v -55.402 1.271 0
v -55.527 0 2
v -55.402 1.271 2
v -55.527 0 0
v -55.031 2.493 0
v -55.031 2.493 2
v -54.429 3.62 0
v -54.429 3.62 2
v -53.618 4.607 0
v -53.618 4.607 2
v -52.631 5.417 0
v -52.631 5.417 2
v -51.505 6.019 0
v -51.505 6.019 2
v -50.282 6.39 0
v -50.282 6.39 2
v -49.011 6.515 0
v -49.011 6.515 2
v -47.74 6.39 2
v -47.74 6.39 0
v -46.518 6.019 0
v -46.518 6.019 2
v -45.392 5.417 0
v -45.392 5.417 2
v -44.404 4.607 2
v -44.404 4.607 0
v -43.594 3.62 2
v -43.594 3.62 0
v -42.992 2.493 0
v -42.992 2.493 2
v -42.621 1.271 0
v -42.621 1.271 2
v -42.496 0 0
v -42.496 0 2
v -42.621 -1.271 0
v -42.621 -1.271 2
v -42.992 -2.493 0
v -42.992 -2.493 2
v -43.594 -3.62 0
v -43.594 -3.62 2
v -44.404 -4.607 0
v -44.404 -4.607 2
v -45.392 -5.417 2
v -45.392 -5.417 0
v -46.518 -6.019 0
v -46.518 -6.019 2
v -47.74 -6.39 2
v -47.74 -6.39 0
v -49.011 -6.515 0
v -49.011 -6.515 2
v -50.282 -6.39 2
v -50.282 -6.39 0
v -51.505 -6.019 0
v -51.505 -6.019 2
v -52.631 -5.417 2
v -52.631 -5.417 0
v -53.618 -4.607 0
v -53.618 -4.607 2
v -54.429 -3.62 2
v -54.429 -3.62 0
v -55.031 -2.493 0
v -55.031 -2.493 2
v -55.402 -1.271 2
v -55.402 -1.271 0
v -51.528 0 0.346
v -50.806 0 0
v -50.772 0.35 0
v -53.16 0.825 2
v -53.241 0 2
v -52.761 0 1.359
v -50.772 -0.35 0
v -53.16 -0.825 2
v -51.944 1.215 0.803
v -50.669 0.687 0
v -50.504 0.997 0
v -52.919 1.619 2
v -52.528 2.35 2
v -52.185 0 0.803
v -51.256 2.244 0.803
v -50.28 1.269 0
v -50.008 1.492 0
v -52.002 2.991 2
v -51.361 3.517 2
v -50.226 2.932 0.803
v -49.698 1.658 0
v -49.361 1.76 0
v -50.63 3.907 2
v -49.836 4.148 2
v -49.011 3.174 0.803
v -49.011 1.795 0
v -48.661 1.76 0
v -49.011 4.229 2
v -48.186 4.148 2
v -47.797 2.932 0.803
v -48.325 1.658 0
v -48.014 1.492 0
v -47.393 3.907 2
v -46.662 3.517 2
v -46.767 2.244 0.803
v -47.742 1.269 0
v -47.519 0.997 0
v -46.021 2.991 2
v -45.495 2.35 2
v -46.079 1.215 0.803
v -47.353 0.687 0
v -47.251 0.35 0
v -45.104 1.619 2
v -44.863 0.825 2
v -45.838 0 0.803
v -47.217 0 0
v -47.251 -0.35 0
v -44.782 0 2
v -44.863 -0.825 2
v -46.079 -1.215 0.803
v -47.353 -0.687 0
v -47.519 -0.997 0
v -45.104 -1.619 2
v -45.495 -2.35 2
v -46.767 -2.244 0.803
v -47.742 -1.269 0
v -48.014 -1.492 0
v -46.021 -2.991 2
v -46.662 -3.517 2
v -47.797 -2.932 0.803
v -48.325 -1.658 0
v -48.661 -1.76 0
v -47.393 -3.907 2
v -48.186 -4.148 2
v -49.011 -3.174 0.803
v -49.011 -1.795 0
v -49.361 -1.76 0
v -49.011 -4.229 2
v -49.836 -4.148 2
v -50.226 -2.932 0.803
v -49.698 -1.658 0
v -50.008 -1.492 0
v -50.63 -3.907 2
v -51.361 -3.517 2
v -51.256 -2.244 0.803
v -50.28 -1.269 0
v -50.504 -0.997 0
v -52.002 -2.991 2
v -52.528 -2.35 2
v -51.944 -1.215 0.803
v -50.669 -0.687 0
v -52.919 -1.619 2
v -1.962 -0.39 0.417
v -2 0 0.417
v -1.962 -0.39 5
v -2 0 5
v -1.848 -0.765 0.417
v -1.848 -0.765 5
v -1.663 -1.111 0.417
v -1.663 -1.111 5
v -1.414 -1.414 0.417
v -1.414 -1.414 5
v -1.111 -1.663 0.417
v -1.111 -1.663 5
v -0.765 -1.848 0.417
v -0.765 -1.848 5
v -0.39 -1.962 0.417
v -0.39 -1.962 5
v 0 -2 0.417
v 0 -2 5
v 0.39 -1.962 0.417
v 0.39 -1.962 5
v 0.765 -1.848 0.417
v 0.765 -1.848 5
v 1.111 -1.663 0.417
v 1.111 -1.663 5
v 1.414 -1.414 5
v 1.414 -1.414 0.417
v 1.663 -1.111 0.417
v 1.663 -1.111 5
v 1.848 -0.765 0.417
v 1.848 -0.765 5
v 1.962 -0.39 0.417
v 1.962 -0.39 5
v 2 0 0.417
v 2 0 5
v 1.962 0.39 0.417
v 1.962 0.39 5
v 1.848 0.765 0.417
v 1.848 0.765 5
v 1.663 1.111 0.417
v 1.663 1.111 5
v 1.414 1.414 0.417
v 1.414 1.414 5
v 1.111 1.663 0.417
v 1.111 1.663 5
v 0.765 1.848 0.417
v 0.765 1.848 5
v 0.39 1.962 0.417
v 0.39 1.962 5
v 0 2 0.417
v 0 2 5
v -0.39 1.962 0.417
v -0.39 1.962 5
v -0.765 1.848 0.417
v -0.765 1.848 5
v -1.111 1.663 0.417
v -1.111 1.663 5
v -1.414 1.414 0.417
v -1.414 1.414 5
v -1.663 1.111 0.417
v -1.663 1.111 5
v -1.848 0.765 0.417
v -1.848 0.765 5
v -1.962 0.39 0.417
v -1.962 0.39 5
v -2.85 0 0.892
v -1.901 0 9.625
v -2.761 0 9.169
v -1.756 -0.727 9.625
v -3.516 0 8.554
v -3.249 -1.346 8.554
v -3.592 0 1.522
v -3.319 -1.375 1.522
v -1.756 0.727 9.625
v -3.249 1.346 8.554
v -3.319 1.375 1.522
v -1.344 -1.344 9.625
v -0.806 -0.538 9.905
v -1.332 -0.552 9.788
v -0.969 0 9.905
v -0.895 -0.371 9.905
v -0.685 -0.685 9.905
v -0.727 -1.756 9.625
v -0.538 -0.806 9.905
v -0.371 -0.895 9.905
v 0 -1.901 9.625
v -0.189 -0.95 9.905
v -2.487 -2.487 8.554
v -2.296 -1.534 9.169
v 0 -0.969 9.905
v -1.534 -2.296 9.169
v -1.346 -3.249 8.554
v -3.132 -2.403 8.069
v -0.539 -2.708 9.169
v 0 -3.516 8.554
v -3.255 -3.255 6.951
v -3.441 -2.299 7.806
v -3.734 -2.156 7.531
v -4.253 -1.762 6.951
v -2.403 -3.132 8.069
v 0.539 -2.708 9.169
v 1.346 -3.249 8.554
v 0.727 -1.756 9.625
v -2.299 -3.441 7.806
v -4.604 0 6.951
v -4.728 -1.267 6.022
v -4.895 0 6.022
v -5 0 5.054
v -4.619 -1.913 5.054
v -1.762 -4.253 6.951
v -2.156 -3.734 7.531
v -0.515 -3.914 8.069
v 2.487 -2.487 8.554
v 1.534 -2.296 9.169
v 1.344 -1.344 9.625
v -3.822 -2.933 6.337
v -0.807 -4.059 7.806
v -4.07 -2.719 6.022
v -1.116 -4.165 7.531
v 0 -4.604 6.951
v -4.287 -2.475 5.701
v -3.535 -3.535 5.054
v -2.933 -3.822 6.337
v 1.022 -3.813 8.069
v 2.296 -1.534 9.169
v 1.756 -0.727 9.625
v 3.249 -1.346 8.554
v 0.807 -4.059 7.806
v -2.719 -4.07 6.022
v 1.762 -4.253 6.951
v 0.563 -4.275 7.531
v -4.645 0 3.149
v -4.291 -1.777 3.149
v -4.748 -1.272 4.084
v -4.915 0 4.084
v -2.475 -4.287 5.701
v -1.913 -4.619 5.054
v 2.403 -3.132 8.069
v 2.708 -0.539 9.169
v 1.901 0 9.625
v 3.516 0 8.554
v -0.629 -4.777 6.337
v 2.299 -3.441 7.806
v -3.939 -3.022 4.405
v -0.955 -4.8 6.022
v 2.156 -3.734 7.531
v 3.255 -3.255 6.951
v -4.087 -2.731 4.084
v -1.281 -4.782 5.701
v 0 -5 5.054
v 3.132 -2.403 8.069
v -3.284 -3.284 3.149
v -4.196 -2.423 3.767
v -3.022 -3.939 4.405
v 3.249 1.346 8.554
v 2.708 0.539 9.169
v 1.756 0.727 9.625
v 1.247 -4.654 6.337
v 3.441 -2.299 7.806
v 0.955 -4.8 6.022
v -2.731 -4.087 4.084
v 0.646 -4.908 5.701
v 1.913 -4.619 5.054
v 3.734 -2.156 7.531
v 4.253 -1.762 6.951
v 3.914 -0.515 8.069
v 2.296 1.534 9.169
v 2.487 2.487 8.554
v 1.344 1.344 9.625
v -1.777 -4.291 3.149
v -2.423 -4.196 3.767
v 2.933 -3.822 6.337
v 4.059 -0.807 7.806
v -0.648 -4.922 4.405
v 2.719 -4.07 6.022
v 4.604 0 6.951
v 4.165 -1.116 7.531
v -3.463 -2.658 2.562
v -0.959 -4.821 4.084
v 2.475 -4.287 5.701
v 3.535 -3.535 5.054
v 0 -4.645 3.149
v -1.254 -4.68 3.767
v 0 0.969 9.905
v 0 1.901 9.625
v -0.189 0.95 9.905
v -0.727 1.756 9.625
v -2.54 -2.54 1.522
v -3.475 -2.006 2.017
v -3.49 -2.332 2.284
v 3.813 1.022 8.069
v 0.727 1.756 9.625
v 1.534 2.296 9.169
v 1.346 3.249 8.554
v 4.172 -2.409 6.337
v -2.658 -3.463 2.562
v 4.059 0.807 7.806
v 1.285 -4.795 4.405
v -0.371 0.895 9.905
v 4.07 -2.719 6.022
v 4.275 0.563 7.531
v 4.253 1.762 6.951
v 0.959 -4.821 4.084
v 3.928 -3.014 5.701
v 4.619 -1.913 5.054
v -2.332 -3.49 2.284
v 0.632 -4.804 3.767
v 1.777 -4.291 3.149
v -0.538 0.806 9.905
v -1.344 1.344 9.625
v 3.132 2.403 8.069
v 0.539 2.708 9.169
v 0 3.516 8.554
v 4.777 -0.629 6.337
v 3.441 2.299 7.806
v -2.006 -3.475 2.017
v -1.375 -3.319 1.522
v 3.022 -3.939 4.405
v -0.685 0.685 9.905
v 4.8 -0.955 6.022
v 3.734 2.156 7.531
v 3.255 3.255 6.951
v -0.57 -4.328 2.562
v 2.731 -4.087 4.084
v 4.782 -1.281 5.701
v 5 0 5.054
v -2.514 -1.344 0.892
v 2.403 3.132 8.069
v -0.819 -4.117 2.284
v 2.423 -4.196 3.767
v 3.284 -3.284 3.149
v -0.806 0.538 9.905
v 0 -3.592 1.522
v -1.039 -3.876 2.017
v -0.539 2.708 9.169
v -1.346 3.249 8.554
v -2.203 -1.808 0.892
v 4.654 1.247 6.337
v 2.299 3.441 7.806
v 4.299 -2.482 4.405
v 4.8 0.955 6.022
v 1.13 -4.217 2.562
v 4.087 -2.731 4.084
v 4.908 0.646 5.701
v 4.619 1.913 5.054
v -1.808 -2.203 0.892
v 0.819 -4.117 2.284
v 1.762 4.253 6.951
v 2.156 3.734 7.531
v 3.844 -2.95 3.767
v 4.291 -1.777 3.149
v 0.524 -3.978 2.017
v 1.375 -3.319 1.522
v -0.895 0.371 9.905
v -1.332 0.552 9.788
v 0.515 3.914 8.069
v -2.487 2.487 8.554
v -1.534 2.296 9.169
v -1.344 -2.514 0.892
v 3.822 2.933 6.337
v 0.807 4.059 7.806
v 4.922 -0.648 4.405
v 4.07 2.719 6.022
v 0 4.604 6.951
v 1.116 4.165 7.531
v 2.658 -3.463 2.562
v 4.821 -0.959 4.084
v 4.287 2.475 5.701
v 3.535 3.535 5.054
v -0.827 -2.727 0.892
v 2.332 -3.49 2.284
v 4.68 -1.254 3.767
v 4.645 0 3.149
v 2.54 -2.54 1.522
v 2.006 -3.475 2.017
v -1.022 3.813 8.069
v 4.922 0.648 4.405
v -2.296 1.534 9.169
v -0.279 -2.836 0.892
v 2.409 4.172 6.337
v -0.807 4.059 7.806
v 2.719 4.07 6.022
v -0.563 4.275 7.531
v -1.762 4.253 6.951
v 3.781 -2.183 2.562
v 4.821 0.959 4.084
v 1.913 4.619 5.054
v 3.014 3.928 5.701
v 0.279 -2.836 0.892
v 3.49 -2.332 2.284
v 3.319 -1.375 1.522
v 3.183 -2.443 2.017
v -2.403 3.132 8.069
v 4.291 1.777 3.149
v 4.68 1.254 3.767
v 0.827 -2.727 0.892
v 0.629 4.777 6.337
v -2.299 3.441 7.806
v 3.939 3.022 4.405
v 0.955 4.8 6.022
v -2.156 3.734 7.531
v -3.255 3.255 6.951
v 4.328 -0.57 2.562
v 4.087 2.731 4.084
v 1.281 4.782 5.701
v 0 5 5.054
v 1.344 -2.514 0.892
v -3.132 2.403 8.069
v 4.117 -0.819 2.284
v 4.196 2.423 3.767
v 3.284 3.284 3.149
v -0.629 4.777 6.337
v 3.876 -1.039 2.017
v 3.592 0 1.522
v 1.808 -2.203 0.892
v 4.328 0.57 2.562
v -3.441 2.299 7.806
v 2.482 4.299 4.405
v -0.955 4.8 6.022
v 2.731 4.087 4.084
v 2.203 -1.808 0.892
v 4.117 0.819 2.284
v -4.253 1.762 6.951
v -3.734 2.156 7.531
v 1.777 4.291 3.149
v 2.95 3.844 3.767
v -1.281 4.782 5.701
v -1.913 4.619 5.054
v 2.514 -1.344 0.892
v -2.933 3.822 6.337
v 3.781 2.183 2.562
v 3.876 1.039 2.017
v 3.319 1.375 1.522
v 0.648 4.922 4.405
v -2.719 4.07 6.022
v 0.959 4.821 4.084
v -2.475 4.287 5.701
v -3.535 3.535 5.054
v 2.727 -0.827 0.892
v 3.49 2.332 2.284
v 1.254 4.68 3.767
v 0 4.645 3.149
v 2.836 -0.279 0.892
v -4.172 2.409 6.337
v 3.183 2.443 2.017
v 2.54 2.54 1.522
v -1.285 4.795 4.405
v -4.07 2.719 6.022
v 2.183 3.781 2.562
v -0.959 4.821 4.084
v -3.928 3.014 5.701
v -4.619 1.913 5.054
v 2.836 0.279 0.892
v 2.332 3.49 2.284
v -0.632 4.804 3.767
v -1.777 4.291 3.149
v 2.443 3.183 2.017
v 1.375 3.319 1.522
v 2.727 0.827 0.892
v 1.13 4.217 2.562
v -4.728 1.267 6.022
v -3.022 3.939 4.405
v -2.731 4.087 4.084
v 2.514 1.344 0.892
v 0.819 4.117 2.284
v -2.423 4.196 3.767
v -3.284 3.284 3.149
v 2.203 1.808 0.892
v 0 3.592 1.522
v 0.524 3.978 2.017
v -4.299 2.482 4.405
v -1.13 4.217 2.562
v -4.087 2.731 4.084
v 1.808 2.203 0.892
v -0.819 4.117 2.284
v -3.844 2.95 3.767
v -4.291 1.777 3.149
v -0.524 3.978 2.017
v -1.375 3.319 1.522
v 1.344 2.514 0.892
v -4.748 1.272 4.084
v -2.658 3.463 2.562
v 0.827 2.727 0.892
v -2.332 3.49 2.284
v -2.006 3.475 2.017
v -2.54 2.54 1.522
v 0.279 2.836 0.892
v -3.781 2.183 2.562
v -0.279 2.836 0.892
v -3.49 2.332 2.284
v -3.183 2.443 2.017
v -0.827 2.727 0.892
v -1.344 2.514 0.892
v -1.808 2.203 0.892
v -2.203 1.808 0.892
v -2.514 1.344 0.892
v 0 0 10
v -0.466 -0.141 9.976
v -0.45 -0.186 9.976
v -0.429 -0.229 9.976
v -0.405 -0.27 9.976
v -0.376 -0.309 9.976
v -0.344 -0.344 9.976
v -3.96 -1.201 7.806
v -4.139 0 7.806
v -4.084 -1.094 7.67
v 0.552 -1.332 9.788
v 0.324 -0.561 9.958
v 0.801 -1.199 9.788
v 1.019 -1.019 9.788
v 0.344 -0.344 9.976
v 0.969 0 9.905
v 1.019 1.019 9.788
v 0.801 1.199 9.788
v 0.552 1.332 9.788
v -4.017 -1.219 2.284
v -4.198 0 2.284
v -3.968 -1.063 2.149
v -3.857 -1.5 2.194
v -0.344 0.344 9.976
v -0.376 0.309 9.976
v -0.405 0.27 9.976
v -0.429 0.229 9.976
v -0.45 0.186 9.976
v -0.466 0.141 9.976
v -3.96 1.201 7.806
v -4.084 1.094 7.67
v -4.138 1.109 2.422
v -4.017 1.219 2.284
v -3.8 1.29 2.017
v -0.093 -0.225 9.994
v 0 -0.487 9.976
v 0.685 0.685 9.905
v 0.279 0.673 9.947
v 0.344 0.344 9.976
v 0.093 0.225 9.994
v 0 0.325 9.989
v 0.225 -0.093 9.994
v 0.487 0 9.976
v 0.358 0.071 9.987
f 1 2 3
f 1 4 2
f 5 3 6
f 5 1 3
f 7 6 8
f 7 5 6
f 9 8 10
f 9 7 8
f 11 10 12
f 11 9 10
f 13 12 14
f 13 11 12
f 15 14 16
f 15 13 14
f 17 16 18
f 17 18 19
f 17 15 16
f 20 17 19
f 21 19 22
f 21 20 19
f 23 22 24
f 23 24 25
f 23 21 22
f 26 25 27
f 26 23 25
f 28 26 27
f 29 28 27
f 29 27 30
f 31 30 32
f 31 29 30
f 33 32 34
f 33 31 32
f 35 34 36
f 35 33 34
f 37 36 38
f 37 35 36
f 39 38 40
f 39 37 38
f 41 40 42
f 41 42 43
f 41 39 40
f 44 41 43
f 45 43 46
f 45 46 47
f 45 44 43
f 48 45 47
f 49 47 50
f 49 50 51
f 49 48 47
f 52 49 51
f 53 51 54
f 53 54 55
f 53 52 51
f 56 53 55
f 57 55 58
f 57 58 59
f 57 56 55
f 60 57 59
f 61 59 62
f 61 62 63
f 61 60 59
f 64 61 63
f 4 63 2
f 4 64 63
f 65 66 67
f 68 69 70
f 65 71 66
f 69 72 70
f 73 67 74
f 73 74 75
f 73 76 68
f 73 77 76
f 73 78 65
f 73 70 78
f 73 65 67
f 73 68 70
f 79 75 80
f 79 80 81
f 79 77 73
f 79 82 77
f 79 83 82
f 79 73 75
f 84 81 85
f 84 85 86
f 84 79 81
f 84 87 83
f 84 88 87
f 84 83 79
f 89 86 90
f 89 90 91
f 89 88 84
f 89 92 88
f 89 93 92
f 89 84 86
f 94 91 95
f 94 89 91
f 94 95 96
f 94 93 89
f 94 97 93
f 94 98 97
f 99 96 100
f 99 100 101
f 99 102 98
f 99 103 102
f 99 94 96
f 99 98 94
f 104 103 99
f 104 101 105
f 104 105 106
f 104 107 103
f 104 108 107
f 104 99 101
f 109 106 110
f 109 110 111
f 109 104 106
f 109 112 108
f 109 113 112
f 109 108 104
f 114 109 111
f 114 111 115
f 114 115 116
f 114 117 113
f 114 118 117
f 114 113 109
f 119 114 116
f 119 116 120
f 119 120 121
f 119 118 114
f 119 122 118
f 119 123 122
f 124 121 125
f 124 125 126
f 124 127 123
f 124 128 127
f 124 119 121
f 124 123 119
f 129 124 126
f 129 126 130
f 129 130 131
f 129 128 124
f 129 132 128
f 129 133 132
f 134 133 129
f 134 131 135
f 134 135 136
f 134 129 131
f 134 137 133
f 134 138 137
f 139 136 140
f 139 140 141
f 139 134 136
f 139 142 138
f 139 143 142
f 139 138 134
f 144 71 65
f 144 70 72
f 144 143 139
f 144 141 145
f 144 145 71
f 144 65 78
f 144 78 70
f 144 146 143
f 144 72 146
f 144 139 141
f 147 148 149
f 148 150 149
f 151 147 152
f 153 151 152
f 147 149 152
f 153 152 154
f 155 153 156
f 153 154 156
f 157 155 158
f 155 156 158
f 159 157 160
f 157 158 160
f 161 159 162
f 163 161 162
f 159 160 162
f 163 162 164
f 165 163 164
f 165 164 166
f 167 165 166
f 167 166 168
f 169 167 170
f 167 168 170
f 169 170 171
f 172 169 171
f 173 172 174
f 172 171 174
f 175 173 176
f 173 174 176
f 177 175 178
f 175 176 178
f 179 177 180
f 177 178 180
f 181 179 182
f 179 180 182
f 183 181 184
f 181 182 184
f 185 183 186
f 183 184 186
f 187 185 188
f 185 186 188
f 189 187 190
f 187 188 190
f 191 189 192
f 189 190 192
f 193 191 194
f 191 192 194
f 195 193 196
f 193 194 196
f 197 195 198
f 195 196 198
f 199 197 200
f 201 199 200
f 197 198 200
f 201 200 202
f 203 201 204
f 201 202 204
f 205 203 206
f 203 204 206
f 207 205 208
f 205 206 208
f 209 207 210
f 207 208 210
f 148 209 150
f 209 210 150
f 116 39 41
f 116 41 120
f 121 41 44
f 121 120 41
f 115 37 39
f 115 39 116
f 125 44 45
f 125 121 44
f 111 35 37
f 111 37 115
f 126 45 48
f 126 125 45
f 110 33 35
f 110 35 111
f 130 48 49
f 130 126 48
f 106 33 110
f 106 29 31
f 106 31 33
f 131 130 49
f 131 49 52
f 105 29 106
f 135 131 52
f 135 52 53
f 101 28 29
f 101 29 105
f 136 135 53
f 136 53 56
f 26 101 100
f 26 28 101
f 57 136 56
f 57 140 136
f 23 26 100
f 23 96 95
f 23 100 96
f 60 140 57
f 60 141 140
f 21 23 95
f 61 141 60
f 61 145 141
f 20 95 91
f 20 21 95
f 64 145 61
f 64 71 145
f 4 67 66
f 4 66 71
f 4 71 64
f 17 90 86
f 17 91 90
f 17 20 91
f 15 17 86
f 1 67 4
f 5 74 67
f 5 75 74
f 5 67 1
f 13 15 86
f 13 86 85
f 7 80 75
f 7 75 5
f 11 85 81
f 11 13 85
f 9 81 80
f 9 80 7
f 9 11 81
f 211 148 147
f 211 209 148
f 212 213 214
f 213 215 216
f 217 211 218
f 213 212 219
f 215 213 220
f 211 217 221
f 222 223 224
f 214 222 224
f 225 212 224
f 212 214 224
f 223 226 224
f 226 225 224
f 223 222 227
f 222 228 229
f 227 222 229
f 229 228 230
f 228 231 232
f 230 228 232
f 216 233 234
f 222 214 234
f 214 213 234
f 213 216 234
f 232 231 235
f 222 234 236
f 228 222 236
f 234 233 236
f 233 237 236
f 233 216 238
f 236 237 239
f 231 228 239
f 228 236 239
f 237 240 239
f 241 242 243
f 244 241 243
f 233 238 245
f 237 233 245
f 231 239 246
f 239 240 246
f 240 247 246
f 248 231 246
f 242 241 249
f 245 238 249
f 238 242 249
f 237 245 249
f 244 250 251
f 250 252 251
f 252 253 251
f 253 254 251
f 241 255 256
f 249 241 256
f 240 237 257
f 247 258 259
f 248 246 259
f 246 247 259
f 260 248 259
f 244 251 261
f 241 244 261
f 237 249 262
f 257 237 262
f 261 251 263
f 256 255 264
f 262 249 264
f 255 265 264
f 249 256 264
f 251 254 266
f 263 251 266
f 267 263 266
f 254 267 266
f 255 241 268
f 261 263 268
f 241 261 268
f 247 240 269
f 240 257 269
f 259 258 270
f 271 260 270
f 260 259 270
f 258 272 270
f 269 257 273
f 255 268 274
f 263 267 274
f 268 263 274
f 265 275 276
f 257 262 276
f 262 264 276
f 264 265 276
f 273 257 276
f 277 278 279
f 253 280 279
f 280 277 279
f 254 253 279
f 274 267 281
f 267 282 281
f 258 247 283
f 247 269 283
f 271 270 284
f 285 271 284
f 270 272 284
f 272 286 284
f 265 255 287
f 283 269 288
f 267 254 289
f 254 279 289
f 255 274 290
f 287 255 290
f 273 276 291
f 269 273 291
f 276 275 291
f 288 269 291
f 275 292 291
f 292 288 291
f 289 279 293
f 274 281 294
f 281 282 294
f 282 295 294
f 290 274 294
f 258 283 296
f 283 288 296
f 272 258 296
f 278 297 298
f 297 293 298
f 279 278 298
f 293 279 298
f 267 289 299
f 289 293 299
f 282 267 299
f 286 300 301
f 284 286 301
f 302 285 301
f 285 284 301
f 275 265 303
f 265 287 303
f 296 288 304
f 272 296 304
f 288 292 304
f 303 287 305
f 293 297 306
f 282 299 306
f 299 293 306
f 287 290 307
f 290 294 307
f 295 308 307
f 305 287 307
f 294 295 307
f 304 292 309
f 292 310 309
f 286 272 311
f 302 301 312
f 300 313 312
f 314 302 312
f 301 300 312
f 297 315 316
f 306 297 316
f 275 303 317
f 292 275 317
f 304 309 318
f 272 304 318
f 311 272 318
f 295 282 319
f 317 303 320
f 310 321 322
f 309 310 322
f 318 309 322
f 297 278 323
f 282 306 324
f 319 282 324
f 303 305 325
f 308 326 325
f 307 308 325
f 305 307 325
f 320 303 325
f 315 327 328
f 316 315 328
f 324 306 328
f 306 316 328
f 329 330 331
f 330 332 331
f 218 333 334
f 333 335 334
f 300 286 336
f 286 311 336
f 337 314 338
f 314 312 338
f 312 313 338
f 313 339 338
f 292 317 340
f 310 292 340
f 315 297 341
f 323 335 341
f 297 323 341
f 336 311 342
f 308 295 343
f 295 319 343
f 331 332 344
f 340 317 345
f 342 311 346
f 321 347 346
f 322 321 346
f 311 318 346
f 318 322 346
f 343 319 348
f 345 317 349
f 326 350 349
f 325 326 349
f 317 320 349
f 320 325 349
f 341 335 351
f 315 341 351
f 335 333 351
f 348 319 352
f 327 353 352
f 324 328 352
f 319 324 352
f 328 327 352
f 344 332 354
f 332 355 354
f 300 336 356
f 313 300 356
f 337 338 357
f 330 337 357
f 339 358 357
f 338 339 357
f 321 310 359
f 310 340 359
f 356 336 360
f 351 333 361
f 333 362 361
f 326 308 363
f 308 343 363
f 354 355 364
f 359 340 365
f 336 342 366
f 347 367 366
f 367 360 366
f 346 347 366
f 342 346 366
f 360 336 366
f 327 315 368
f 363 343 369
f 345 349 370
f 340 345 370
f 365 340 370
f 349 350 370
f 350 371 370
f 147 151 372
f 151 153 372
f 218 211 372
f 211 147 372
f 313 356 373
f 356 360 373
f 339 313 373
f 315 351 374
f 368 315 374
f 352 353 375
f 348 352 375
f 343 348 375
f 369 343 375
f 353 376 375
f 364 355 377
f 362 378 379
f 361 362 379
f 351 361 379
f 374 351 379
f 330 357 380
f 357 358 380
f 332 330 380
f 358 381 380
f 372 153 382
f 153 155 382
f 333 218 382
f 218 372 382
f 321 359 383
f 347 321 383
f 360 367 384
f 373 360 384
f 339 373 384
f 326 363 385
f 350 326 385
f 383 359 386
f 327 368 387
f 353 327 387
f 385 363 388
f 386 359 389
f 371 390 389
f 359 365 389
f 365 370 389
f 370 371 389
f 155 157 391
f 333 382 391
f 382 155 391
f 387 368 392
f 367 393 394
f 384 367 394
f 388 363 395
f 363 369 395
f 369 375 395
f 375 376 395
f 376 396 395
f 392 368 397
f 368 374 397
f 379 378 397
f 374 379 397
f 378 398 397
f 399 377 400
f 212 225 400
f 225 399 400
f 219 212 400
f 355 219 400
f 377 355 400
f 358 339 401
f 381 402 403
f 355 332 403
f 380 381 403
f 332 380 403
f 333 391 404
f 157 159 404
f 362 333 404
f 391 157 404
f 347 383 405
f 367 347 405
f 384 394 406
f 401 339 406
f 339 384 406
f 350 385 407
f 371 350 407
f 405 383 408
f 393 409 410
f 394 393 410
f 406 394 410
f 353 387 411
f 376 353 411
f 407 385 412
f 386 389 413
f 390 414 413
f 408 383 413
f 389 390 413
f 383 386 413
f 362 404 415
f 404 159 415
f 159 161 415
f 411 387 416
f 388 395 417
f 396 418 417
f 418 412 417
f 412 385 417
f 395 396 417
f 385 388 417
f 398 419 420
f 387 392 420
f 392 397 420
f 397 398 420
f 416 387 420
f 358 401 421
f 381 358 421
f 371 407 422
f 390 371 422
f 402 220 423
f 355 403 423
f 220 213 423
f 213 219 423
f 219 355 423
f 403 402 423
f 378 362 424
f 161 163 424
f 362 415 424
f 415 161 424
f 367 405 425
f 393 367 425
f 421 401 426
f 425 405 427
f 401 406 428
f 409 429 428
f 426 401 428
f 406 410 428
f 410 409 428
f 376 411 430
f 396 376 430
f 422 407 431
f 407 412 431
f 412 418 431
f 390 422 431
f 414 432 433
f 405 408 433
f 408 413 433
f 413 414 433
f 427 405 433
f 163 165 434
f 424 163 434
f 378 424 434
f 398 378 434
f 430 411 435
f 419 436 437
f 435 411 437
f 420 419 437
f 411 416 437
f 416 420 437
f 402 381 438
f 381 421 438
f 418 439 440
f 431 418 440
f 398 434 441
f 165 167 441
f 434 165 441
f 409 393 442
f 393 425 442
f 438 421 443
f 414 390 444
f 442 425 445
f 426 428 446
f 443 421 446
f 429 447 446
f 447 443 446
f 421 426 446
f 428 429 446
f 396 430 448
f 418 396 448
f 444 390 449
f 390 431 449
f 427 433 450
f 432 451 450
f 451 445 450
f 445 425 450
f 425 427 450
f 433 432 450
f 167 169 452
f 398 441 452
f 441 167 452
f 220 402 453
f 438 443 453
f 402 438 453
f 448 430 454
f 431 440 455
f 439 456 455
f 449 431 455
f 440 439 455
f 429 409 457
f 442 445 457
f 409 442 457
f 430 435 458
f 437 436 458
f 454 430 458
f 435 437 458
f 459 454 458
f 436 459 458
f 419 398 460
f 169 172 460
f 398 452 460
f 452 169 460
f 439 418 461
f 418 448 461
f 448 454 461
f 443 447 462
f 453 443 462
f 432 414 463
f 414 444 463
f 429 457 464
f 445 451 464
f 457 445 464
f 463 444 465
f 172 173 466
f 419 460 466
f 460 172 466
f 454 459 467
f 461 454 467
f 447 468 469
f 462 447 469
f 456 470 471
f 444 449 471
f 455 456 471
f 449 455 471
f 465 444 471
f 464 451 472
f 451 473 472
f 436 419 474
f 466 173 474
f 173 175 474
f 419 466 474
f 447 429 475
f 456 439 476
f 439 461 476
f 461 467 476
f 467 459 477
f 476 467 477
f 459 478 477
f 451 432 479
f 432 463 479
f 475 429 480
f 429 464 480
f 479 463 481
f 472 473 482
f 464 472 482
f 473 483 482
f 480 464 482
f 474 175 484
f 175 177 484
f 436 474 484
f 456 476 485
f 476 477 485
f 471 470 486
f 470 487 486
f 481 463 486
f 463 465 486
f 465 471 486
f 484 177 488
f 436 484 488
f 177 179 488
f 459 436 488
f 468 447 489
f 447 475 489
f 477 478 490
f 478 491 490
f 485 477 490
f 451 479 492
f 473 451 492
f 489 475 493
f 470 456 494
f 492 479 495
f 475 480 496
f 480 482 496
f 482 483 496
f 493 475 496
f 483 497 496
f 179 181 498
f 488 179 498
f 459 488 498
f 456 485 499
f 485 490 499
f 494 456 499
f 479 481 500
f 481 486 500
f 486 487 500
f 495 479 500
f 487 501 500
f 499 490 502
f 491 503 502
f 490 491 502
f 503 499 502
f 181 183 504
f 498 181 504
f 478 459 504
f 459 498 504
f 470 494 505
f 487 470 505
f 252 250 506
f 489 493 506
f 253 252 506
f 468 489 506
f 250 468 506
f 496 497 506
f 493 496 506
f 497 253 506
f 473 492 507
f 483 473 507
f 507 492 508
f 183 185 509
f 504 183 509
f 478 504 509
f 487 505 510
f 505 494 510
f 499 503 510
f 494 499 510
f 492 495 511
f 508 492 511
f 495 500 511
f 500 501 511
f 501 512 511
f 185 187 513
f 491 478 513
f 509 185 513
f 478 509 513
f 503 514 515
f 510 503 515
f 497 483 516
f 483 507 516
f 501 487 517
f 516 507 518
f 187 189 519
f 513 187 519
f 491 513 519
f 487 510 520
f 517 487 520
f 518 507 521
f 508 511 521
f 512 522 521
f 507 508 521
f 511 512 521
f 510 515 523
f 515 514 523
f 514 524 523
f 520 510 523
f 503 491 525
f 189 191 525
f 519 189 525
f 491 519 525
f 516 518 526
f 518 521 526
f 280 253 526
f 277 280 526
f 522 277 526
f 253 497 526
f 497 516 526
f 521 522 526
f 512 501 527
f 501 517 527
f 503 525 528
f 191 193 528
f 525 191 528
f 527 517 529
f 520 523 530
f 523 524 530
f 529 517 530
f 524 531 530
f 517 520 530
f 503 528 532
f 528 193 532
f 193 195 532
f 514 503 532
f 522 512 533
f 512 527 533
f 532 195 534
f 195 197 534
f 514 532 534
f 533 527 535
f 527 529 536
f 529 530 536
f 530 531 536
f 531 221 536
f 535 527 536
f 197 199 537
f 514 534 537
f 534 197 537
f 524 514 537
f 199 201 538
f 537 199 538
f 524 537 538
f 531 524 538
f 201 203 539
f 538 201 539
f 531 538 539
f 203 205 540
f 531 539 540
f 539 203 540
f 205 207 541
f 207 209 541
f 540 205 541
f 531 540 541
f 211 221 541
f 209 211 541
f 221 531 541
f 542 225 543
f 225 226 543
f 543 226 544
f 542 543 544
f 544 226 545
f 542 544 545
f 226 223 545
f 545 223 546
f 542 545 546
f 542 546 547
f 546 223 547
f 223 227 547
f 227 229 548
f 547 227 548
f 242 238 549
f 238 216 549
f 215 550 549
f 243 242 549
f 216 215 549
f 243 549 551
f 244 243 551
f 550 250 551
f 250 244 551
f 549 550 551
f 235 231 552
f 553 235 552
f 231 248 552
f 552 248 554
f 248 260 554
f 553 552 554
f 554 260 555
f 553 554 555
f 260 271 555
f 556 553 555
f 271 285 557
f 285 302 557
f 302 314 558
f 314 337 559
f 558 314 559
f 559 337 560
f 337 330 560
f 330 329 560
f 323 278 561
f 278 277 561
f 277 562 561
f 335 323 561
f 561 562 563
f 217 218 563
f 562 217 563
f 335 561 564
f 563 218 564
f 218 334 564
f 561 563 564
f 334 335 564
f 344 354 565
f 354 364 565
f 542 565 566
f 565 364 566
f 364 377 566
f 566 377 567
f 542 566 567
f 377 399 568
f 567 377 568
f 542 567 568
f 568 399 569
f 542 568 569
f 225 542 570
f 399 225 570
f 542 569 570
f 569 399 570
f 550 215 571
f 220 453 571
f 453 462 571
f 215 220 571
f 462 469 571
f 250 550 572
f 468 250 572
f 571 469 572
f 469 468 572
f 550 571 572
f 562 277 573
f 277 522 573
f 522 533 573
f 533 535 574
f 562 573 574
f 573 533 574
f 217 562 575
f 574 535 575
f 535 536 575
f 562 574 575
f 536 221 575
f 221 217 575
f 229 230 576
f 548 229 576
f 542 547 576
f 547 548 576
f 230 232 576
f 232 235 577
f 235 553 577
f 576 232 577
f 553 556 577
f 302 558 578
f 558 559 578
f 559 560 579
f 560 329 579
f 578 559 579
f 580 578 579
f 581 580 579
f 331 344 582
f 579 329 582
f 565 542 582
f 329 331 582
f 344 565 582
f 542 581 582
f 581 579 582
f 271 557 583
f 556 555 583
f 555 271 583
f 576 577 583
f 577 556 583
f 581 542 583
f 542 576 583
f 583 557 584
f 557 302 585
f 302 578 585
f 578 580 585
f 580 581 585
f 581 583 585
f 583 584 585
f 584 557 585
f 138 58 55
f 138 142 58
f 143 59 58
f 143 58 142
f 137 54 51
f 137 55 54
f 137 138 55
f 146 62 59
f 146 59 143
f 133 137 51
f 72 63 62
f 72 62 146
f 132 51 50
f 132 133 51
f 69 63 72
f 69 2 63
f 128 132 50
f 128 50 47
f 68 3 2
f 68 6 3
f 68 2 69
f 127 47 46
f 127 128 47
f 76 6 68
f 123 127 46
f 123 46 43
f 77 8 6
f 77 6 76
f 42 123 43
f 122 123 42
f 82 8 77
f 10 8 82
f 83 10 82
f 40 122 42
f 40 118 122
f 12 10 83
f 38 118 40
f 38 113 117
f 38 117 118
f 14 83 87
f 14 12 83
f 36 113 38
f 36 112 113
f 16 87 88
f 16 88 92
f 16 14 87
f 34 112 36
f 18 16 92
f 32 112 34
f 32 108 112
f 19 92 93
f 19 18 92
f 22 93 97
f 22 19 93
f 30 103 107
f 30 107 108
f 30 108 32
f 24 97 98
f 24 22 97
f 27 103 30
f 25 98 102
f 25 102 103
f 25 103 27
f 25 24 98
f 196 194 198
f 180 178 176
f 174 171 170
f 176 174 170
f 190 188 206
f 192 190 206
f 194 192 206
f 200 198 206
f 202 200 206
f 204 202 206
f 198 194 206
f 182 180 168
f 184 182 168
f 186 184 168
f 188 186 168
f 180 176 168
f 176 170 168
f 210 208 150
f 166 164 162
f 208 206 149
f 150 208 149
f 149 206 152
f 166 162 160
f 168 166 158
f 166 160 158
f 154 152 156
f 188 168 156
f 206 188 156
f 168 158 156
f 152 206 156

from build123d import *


with BuildPart() as f1:
    # F0 (on Front) → F1 (revolve)
    with BuildSketch(Plane.XZ):
        with BuildLine():
            ThreePointArc((0, 10), (-4.894532, 6.021548), (-2, 0.417424))
            Line((-2, 0.417424), (-2, 5))
            Line((-2, 5), (0, 5))
            Line((0, 5), (0, 10))
        make_face()
    revolve(axis=Axis((0, 0, 7.5), (0, 0, 1)))


with BuildPart() as f3:
    # F2 (on Front) → F3 (revolve)
    with BuildSketch(Plane.XZ):
        with BuildLine():
            Line((-55.526811, 0), (-50.806088, 0))
            ThreePointArc((-50.806088, 0), (-52.185109, 0.803202), (-53.240811, 2))
            Line((-53.240811, 2), (-55.526811, 2))
            Line((-55.526811, 2), (-55.526811, 0))
        make_face()
    revolve(axis=Axis((-49.011366, 0, 2.333397), (0, 0, -1)))


solid = Compound([f1.part, f3.part])
